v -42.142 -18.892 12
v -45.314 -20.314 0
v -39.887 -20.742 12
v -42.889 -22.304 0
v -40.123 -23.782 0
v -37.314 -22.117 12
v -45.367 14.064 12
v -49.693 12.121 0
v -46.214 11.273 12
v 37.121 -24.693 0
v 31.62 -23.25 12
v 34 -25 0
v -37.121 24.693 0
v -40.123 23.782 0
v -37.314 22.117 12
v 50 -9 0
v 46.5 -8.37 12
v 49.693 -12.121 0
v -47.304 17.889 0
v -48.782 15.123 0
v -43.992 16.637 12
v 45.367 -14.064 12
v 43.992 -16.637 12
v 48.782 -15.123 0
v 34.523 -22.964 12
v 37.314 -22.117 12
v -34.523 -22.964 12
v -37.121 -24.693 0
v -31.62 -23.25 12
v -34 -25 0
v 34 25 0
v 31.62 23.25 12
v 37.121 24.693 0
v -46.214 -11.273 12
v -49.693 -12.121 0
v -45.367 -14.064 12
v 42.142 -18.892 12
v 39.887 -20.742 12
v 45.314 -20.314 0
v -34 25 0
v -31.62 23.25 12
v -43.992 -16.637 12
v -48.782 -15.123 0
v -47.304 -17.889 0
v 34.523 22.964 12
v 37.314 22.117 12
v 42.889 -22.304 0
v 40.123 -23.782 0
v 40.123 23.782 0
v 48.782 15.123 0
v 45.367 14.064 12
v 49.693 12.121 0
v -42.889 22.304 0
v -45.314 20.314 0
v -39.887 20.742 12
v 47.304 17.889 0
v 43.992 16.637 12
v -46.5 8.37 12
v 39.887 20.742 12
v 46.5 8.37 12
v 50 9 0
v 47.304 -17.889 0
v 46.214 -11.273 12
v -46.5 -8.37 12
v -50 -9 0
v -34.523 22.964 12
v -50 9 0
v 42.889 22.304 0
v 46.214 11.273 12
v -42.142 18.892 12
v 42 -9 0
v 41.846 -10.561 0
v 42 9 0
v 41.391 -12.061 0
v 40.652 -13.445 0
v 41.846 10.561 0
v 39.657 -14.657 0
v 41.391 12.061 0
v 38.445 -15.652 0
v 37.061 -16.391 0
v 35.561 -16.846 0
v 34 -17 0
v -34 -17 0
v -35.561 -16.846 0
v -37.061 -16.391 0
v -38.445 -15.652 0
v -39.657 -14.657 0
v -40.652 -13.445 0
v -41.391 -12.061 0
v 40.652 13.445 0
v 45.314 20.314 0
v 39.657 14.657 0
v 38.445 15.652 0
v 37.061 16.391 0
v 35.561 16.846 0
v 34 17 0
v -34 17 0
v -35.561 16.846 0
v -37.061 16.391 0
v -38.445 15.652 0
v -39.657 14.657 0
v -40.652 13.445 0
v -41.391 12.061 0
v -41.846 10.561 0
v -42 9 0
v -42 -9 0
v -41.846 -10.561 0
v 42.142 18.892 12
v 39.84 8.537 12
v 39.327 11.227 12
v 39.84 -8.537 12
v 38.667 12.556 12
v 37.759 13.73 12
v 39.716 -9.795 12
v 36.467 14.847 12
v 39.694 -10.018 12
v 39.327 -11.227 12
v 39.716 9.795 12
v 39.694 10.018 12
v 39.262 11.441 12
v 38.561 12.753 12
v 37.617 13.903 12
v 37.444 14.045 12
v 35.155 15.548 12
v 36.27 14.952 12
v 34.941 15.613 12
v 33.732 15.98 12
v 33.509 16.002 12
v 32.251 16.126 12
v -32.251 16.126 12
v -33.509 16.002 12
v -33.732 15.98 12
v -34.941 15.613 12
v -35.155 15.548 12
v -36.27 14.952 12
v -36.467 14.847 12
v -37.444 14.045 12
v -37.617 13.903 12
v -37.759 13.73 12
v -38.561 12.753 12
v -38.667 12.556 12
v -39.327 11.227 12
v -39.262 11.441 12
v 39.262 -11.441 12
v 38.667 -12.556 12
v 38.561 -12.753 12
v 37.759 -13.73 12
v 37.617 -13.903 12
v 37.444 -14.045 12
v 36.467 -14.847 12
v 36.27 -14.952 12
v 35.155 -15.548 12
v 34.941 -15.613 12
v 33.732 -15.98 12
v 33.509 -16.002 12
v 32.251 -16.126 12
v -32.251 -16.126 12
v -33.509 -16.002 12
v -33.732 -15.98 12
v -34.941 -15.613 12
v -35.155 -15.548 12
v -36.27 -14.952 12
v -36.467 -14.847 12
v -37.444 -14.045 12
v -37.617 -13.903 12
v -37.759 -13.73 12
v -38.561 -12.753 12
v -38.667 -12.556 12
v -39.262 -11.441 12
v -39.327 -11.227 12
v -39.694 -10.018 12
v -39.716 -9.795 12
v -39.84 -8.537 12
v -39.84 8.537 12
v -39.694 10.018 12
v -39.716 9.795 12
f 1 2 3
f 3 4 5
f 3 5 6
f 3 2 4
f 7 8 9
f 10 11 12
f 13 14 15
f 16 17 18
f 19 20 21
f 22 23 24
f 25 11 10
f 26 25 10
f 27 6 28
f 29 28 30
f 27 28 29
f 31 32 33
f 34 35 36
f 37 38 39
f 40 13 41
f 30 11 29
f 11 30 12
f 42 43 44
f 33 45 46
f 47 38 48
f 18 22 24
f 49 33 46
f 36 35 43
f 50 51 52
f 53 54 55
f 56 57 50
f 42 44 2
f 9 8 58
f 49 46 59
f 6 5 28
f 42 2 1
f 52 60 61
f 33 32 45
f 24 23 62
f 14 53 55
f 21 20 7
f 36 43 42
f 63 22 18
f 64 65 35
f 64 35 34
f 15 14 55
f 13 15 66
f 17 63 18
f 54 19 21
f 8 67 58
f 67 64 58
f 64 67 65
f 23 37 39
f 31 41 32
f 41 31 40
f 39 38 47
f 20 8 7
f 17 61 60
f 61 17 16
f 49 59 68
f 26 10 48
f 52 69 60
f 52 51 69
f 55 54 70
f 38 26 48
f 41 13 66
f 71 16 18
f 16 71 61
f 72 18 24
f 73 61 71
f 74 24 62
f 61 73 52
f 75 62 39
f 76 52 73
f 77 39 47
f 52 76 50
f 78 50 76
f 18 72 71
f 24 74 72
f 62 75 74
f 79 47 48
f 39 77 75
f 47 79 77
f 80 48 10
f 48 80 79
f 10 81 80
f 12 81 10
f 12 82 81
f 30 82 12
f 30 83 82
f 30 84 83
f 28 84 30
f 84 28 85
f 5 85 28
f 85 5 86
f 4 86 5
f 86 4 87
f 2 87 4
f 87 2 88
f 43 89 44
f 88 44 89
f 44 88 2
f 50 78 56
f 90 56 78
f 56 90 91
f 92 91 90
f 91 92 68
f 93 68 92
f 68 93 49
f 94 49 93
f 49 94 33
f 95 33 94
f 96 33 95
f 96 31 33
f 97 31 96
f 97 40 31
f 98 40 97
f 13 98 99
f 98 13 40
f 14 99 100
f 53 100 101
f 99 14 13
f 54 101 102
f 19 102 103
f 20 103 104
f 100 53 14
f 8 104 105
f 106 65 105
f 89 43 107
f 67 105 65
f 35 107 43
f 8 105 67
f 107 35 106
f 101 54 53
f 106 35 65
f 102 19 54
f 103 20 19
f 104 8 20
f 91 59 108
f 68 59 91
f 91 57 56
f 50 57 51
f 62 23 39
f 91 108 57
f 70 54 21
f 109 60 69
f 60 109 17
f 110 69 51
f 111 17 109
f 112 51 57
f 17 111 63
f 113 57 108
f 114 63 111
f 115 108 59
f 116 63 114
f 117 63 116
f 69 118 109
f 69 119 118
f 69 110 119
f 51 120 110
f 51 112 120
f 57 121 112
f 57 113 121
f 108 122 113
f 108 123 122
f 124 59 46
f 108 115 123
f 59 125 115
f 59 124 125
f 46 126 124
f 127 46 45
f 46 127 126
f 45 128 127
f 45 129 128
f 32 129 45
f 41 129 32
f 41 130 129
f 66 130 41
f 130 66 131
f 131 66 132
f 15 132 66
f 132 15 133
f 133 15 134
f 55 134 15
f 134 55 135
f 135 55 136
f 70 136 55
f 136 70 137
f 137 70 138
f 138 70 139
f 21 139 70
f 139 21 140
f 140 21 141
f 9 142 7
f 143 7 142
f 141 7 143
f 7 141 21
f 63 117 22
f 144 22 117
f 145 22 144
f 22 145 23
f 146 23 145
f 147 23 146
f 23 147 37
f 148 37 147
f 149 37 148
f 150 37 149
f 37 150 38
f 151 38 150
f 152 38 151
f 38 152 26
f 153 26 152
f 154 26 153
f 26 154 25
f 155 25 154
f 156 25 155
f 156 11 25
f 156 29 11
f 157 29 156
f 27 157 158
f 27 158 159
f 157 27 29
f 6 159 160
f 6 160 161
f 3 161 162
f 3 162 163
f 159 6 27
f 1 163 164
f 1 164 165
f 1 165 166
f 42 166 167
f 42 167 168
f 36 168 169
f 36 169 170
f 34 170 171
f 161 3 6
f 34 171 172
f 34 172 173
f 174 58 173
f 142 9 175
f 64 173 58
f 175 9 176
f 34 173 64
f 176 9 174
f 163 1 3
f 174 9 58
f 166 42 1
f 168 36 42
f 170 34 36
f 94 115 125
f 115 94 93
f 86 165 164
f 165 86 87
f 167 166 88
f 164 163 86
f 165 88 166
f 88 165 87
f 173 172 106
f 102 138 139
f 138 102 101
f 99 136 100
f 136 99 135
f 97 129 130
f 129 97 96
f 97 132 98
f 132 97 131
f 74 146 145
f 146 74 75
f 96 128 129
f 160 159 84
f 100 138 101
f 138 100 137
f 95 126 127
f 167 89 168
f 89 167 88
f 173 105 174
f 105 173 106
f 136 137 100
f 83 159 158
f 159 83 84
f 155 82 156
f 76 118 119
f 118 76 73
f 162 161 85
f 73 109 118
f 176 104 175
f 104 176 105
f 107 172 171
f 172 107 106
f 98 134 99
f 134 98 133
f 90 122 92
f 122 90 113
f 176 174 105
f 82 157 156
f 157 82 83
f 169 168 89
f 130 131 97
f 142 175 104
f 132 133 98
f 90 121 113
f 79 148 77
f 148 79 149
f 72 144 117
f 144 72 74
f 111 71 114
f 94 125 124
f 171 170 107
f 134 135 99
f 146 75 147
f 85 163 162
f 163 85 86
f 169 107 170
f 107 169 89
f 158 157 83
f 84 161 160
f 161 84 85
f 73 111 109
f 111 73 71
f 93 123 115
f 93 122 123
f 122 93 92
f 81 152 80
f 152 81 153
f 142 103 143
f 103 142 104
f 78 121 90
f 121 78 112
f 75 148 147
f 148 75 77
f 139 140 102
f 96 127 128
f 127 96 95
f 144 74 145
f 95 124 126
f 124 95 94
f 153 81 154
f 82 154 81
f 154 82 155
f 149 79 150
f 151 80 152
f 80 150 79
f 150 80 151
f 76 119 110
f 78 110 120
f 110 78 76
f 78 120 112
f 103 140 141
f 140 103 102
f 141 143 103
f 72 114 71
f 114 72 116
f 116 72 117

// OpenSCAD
$fn = 32;

// ----------------------------------------------------------------------
// Display bezel: 100 x 50 mm frame, opening 84x34 mm
// ----------------------------------------------------------------------

// --- parameters (mm) ---
length = 100;             // frame outside length, X
width = 50;               // frame outside width, Y
frame_w = 8;              // frame width
thickness = 12;           // frame thickness
corner_r = 16;            // outside corner radius
chamfer = 0.93;           // outer wall taper
funnel = 0.94;            // inner opening taper
opening_l = 84;           // opening length
opening_w = 34;           // opening width
inner_r = 8;              // opening corner radius

/* rounded-rectangle outlines, generated with loops */
module rounded_ring(l_nom, w_nom, r) {
  hull() {
    for (sx = [-1, 1]) for (sy = [-1, 1])
      translate([sx * (l_nom / 2 - r), sy * (w_nom / 2 - r)]) circle(r = r);
  }
}

difference() {
  /* frame body, drafted so the outer edge is a variable-depth chamfer */
  linear_extrude(height = thickness, scale = chamfer)
    rounded_ring(length, width, corner_r);
  /* viewing opening, drafted the other way for a funnel edge */
  linear_extrude(height = thickness + 2, scale = funnel)
    translate([0, 0, -1]) rounded_ring(opening_l, opening_w, inner_r);
}
